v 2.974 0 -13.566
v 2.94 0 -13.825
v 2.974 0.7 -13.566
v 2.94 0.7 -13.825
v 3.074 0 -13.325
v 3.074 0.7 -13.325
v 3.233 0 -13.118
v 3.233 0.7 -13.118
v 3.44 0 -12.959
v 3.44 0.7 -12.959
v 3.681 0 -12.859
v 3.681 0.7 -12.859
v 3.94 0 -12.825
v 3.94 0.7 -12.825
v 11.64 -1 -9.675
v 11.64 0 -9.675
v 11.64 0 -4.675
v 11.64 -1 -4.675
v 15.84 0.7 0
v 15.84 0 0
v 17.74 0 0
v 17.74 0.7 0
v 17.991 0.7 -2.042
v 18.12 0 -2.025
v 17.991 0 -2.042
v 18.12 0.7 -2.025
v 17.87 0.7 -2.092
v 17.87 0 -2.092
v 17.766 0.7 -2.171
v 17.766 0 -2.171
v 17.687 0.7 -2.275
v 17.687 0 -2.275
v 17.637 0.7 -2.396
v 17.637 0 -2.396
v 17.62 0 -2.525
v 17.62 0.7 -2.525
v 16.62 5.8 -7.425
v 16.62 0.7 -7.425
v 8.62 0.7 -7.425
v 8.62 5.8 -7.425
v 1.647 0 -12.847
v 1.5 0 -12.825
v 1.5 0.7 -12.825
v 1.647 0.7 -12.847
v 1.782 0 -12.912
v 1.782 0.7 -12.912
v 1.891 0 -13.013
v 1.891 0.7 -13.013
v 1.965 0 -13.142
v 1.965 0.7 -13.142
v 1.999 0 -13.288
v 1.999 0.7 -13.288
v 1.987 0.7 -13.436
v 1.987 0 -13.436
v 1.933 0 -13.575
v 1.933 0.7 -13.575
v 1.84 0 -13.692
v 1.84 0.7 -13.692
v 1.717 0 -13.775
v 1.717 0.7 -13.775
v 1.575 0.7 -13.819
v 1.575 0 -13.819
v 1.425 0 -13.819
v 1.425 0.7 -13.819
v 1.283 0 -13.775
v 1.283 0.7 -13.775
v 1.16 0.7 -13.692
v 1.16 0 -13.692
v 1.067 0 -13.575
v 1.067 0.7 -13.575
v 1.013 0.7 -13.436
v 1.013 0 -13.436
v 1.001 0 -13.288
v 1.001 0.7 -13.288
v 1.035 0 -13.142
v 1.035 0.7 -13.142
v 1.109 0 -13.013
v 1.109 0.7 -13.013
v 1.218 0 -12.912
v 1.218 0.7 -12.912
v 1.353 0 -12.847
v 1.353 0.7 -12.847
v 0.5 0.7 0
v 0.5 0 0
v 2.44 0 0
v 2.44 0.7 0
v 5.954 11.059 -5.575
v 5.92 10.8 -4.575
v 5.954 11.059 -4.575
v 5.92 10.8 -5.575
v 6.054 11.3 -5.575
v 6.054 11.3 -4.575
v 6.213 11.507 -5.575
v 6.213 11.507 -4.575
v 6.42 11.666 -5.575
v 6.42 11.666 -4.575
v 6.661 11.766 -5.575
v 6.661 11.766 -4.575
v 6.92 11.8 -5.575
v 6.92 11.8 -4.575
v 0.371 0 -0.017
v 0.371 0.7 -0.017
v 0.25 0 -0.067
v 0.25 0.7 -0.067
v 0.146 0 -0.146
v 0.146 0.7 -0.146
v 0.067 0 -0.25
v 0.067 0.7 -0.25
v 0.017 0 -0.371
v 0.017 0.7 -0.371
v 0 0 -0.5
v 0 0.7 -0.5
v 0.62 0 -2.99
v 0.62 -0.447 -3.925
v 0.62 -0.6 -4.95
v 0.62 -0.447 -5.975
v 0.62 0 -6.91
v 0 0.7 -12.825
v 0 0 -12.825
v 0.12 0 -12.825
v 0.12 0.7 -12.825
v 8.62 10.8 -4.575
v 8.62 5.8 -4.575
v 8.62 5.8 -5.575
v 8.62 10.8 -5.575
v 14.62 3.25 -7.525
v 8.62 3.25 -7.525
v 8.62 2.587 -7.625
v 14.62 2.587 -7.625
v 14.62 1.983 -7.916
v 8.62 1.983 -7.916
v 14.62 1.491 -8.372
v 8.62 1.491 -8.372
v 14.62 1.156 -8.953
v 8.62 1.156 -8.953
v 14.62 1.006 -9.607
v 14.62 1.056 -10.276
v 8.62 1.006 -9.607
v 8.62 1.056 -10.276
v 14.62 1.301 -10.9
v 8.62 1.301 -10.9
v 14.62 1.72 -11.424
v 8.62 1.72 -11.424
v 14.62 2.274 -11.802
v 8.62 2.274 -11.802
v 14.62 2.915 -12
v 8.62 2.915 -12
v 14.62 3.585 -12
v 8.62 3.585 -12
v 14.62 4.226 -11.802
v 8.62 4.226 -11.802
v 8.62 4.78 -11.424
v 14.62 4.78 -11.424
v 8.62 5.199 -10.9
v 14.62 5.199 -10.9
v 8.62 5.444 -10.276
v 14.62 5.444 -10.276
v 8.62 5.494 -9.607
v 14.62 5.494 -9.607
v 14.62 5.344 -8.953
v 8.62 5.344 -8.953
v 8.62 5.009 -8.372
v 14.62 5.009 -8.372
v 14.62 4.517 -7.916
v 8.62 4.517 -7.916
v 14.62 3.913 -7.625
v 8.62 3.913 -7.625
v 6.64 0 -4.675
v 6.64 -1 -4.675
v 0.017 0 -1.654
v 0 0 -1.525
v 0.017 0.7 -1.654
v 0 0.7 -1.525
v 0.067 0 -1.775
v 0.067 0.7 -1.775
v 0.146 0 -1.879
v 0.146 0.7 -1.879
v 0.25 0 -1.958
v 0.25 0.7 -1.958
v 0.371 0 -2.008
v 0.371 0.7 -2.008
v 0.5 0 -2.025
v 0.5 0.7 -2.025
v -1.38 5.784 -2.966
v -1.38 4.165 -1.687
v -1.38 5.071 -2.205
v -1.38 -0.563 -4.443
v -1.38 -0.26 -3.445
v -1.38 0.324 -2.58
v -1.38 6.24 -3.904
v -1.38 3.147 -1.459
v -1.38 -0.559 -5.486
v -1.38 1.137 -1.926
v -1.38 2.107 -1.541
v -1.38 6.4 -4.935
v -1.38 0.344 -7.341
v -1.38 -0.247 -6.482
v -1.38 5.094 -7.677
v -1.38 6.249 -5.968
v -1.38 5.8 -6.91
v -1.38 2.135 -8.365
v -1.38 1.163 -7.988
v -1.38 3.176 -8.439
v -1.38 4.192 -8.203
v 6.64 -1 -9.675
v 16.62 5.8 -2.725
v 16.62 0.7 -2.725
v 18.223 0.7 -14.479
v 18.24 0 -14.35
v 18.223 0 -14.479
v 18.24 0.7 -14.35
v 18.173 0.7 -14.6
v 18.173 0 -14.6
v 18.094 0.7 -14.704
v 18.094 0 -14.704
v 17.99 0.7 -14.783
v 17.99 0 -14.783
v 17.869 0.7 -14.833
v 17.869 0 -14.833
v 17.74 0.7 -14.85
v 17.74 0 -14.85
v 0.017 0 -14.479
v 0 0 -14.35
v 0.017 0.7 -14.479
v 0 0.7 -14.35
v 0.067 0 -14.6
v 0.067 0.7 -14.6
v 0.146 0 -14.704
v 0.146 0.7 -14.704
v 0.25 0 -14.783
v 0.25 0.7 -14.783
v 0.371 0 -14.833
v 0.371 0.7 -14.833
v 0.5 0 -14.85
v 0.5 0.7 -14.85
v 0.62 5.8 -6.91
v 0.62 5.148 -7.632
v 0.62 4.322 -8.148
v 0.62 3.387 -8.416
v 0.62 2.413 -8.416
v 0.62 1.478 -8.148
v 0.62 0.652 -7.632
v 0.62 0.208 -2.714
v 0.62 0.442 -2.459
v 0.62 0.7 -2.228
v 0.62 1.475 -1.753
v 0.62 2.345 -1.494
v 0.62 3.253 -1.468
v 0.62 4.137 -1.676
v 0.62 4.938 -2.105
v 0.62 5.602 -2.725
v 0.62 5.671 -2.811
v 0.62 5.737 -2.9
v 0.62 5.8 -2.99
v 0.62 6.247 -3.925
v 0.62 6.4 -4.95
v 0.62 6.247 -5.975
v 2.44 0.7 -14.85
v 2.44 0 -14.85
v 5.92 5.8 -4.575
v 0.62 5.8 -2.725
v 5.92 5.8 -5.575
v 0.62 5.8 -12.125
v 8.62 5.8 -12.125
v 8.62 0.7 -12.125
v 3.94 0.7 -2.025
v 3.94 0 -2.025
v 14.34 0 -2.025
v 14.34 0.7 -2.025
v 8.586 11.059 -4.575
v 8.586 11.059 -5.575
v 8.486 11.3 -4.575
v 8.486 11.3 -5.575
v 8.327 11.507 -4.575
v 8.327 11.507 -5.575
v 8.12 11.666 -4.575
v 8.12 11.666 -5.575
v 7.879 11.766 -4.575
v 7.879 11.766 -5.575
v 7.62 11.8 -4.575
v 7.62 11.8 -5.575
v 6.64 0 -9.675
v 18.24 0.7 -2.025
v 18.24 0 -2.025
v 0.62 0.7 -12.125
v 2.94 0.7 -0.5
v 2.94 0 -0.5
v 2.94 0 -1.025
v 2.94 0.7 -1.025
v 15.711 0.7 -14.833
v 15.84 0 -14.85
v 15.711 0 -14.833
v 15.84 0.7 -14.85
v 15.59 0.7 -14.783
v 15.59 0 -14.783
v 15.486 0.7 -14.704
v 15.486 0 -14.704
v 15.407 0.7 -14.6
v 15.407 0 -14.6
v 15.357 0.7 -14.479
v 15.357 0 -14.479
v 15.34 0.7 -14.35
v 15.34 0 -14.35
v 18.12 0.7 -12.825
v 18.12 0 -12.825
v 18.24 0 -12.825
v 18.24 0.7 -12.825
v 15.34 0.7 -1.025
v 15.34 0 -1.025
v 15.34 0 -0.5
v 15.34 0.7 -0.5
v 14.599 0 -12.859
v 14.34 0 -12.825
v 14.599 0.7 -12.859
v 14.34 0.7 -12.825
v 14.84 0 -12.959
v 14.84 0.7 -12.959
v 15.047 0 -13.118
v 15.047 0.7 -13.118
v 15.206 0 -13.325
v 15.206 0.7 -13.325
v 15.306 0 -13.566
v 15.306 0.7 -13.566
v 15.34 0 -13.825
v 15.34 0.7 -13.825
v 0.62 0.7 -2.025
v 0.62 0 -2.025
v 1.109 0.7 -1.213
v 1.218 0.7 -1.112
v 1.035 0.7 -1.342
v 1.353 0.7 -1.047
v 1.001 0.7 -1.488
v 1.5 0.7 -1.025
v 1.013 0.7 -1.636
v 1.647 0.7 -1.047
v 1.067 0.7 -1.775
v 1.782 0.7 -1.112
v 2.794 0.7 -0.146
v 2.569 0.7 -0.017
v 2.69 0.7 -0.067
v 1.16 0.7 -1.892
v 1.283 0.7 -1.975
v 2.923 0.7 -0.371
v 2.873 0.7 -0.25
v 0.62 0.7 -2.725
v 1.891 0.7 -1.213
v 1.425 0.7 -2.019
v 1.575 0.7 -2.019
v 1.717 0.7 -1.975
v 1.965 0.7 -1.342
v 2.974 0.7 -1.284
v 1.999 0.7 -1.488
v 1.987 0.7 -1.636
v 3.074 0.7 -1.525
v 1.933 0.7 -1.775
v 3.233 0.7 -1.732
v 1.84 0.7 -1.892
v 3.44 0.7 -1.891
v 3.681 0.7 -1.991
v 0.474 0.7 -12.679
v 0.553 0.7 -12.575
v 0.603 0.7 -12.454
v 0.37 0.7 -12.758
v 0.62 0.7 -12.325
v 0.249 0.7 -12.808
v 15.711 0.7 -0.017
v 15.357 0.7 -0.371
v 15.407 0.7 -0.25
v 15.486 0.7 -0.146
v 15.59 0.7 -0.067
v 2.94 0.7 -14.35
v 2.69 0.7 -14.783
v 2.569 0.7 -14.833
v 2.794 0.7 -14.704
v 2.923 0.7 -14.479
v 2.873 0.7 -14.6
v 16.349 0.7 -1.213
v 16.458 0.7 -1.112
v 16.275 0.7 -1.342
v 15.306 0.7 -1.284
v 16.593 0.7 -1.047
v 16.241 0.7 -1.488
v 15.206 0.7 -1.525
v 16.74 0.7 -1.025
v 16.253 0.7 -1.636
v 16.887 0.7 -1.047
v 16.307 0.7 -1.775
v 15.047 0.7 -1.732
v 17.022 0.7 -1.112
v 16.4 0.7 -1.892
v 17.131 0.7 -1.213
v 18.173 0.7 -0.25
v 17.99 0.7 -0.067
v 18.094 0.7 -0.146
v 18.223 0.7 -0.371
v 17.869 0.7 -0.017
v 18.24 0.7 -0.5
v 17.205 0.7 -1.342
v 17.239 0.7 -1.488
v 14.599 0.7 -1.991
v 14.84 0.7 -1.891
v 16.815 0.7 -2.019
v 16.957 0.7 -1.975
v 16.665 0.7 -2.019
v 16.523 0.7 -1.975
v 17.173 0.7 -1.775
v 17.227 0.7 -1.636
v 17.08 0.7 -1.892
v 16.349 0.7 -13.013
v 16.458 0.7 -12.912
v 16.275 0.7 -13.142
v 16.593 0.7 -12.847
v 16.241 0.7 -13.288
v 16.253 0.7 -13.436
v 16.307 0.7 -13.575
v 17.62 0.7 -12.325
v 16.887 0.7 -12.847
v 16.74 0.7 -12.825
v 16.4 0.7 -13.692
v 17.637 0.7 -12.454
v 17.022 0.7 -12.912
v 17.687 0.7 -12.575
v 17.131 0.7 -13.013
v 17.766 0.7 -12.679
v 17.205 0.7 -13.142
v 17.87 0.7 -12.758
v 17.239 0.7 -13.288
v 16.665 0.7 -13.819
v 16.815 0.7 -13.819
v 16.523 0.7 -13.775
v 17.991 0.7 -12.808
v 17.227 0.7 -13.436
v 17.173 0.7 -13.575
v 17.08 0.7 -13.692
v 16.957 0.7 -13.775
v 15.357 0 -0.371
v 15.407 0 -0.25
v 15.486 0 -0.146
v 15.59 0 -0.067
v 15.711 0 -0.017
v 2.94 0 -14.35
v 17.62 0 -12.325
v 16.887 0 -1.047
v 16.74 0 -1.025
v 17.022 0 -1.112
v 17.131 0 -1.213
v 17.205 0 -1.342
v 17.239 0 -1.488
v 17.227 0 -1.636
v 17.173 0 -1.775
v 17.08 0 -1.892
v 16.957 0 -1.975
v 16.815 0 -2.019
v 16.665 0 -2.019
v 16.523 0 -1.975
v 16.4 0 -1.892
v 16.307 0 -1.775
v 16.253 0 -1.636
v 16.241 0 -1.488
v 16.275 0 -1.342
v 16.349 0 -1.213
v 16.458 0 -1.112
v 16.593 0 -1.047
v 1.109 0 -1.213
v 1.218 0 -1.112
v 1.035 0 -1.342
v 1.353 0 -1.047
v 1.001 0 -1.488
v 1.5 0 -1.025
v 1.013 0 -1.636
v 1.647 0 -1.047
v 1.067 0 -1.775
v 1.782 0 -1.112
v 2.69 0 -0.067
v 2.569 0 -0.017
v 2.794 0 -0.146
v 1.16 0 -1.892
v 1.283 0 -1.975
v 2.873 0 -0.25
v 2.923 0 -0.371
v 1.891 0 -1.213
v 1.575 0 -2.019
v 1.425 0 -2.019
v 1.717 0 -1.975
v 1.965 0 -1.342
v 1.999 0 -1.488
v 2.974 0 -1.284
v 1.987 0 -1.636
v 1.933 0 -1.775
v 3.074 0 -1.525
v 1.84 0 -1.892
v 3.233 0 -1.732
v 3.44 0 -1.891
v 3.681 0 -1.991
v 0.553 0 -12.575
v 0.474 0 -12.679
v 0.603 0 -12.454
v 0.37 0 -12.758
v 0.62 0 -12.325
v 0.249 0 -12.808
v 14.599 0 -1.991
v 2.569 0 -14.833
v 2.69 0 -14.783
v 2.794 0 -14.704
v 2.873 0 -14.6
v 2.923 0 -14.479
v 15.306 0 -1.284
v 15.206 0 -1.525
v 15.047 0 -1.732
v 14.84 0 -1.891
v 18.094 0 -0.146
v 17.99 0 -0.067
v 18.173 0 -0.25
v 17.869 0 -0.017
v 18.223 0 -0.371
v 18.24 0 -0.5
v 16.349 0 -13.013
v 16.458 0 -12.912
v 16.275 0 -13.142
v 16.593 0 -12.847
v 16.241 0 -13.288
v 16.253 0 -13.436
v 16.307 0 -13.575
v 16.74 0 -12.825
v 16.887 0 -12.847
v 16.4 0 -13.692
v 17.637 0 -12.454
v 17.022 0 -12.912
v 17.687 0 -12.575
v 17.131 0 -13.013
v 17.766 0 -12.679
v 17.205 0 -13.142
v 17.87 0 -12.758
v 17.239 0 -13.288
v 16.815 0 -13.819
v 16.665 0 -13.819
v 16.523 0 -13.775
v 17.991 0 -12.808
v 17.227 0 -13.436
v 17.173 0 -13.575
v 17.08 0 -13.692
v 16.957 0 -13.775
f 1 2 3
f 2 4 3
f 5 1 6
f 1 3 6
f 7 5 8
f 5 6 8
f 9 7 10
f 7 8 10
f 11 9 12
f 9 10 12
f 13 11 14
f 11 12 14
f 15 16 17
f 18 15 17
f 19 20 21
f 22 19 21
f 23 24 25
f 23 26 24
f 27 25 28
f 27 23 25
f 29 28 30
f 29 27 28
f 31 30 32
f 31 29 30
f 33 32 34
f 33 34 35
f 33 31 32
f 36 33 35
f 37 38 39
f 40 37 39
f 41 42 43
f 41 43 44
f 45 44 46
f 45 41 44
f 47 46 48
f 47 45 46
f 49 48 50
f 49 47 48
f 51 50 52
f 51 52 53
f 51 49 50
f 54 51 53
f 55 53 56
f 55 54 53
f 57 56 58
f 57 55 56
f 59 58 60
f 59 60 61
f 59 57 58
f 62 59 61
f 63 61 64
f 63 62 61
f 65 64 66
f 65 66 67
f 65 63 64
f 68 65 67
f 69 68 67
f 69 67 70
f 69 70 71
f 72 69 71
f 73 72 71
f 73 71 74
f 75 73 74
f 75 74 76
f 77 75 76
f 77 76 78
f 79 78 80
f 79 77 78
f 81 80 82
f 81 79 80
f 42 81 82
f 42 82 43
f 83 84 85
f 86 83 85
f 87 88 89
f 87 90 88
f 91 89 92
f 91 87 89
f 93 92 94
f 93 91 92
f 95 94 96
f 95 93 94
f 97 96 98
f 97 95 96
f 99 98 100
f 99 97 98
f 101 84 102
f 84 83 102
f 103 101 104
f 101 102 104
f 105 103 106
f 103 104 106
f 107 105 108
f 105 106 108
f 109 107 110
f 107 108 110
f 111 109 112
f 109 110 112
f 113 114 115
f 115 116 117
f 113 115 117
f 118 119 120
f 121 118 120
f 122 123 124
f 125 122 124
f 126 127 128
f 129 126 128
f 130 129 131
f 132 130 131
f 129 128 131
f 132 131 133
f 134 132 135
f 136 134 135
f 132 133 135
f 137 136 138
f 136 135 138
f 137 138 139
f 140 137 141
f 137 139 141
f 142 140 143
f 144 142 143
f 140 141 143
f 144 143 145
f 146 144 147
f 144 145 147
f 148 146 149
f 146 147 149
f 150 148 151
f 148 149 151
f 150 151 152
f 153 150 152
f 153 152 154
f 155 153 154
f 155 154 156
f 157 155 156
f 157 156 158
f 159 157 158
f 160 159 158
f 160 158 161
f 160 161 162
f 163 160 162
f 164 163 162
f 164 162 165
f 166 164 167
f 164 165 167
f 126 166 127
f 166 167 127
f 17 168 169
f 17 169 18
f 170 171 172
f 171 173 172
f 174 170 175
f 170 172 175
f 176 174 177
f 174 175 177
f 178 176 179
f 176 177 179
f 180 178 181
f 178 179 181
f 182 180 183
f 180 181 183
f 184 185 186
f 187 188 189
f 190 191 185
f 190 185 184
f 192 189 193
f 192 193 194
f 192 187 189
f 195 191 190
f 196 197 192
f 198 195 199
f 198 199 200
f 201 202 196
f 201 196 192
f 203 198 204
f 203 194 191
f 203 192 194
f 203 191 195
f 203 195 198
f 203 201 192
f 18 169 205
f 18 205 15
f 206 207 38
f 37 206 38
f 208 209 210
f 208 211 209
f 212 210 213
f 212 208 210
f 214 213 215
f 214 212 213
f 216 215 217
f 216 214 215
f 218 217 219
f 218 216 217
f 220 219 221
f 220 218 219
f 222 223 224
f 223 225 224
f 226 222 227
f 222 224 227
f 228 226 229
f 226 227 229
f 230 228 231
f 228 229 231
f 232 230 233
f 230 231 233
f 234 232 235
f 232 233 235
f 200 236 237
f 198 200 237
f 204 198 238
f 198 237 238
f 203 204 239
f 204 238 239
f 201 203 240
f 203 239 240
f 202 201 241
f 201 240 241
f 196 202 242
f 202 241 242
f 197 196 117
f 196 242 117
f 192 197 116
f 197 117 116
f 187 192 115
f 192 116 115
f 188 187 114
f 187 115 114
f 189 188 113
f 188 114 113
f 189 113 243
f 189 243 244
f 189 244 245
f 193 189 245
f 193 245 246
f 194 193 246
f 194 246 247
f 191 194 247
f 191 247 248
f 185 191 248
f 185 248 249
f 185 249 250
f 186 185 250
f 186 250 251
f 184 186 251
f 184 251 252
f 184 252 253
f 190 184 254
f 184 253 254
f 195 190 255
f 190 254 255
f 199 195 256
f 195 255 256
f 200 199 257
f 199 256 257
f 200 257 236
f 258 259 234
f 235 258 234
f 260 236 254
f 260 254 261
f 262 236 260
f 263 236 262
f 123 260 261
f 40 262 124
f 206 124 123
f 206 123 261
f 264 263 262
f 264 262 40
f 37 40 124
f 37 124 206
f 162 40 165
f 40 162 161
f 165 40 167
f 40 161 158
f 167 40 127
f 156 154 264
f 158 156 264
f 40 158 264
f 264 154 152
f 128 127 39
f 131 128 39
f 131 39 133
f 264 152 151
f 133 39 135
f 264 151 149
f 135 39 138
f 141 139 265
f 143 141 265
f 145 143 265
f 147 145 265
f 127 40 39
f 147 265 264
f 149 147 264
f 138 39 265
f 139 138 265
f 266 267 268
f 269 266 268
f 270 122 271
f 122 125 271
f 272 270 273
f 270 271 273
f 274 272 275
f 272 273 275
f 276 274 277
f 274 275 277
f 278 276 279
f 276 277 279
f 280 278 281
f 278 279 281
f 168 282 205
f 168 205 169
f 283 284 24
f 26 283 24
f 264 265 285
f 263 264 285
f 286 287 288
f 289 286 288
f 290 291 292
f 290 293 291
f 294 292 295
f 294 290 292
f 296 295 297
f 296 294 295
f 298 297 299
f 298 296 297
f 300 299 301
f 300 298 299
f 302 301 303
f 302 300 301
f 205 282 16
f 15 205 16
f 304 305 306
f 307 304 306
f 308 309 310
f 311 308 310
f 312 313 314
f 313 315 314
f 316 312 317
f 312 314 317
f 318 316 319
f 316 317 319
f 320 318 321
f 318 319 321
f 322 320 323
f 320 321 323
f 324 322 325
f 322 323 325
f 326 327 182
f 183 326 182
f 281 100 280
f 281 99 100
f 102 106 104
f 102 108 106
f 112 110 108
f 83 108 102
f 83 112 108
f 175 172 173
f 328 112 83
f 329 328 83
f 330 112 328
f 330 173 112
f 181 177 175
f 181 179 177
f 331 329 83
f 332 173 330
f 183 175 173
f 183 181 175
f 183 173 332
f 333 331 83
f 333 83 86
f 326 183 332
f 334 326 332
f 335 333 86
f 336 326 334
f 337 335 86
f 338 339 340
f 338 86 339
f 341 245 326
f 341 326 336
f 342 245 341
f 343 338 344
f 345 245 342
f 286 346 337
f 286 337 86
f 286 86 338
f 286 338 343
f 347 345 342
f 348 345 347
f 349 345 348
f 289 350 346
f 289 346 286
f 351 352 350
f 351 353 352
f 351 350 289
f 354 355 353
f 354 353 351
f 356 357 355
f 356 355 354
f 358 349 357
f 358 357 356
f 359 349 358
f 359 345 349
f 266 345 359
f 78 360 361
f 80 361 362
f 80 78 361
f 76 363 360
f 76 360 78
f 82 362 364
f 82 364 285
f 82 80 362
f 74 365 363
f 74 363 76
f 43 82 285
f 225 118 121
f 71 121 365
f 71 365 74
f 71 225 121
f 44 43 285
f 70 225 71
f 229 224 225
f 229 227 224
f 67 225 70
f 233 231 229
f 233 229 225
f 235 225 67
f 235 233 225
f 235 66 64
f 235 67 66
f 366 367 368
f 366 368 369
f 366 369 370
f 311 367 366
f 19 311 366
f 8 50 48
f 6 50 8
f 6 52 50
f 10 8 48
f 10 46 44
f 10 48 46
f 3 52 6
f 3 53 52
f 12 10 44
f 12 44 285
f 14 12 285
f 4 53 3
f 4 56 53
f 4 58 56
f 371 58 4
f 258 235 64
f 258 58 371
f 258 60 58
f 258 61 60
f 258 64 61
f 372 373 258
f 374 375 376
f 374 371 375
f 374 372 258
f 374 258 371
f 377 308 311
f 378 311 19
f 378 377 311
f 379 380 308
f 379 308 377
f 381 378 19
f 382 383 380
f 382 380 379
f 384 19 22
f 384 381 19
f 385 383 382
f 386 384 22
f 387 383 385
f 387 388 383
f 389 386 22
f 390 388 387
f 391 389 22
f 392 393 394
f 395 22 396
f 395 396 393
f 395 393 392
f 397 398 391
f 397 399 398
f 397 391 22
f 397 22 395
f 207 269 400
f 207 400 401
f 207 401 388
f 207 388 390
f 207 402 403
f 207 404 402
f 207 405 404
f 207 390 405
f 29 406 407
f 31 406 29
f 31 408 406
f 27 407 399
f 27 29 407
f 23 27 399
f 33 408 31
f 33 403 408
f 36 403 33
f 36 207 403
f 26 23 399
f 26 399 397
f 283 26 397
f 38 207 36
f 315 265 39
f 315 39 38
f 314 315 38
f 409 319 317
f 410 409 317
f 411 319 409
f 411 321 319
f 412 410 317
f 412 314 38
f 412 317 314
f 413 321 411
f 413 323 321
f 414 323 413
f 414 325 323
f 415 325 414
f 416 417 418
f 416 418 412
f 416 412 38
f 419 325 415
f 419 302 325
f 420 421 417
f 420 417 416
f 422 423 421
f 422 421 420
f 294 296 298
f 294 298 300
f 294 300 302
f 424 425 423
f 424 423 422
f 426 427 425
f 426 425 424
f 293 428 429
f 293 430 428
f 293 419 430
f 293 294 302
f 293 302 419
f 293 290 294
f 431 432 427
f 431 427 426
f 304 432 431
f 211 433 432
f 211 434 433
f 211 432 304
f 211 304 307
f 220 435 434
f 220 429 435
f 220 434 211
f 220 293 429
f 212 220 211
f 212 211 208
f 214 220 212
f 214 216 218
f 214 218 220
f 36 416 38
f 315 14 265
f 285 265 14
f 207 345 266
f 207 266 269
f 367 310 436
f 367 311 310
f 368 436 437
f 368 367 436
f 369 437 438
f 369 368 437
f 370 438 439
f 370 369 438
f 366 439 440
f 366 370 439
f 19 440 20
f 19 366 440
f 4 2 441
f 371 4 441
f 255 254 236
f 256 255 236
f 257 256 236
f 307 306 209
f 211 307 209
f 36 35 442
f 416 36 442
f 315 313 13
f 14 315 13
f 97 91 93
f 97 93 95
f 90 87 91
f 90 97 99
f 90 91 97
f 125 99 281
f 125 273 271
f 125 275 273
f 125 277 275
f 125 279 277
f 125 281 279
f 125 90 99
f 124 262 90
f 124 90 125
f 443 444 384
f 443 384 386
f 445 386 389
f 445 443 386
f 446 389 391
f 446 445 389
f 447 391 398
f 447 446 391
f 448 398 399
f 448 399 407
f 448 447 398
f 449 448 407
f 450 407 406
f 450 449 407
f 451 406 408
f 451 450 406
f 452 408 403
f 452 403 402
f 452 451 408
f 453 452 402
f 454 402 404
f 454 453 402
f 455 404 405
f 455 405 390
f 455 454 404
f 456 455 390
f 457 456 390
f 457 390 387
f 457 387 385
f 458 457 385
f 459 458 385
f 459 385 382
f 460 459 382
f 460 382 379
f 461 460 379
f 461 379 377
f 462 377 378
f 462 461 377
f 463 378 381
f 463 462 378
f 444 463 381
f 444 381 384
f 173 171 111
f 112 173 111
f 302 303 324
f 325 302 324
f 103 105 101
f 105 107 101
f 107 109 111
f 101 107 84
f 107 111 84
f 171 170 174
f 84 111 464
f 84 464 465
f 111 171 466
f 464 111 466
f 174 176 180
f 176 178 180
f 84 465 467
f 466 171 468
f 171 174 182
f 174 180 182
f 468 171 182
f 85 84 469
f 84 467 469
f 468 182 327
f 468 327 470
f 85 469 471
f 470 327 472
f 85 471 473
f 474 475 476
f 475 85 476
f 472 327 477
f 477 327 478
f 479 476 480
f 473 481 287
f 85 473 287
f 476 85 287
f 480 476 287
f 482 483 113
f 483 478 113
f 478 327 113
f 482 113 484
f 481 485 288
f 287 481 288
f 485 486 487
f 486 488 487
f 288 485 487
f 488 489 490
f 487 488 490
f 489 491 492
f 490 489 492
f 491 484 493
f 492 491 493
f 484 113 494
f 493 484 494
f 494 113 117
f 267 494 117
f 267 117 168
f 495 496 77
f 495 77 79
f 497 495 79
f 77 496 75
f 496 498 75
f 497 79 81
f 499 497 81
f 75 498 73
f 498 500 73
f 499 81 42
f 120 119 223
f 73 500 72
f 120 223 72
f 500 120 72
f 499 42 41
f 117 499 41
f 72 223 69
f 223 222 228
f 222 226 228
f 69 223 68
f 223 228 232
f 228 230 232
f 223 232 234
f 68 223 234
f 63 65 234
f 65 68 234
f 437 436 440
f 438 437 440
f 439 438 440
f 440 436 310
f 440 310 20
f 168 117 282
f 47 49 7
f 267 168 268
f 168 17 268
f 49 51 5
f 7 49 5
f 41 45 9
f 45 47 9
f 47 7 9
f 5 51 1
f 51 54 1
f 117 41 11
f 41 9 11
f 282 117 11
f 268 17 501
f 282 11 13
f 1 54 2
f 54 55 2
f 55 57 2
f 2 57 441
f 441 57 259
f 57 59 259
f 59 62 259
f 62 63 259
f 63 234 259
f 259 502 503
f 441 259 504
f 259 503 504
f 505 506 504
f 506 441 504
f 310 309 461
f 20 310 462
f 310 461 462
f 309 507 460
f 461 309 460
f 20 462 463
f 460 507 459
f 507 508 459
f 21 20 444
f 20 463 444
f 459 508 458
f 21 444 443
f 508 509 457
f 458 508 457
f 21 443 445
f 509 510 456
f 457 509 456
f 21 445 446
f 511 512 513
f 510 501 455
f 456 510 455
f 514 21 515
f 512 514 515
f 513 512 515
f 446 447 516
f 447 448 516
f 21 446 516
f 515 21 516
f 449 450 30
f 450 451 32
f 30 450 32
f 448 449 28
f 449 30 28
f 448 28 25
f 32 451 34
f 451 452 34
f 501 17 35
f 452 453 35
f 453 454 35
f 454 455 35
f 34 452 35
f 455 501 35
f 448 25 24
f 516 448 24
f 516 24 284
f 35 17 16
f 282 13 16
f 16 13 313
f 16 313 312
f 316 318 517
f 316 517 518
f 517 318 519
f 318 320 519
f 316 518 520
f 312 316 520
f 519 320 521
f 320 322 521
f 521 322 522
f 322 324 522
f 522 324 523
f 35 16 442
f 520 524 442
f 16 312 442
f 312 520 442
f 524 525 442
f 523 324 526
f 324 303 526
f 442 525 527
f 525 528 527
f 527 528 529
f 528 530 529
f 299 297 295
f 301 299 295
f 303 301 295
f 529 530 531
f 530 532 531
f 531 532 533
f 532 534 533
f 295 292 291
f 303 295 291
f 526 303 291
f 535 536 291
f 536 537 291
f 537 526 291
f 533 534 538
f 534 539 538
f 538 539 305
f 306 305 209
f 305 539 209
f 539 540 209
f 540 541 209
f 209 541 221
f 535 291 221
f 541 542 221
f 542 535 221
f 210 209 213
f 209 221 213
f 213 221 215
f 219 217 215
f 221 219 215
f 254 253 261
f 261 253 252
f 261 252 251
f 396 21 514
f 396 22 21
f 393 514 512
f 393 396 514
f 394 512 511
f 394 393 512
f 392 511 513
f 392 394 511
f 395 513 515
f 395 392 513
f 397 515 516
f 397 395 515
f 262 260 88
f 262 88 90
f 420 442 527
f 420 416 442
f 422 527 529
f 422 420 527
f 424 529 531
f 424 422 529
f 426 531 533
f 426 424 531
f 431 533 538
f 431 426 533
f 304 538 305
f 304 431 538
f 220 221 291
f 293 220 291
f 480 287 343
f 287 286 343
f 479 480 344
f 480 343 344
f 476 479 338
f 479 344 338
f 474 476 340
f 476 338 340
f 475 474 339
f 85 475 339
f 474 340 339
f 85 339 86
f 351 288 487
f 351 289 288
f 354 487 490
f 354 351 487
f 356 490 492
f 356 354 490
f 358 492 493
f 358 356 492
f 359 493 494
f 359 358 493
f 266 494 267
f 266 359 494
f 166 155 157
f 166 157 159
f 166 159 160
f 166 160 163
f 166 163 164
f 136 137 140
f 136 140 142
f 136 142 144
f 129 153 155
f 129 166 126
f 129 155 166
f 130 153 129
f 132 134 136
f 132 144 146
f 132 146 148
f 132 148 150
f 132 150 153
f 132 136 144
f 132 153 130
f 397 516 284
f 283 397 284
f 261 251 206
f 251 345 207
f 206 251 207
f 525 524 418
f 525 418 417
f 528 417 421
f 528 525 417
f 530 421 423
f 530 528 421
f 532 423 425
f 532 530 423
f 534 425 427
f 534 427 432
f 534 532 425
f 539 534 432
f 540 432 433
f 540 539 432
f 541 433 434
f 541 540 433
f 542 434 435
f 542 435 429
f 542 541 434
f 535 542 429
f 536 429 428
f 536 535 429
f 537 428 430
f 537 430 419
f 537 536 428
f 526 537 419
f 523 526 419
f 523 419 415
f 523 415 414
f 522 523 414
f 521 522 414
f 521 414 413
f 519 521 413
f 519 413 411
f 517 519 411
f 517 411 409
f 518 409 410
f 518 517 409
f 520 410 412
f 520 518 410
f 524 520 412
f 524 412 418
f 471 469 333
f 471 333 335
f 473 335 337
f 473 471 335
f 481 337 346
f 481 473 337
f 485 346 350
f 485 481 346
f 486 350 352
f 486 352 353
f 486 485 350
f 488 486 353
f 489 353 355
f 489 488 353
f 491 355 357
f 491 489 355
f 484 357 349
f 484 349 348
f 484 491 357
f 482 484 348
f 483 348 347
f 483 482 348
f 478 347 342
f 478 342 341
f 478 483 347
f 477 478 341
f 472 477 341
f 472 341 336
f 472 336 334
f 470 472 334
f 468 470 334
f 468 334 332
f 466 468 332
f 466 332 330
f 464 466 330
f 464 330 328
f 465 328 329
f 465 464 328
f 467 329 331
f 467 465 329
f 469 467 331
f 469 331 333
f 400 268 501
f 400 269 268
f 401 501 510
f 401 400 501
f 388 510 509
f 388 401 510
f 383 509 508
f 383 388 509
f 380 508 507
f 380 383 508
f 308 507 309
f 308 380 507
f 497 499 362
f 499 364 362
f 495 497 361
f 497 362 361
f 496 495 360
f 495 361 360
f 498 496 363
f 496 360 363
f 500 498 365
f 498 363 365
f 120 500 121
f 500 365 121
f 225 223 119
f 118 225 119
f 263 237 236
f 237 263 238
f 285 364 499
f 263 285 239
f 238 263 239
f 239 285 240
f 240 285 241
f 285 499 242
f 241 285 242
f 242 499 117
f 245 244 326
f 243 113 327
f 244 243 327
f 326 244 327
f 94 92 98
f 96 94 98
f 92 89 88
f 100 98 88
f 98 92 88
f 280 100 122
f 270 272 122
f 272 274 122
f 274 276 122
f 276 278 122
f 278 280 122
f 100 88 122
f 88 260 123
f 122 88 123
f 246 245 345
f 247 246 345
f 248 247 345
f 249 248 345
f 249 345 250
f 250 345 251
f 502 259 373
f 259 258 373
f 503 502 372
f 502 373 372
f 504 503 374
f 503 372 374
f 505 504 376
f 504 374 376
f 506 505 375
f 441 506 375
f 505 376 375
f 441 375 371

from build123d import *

# Parameters (mm, degrees)
SKETCH1_R            = 0.5
BOSS_EXTRUDE1_DEPTH  = 0.7
FILLET1_R            = 1
FILLET2_R            = 0.5
BOSS_EXTRUDE2_DEPTH  = 5.1
SKETCH3_R            = 2.25
BOSS_EXTRUDE7_DEPTH  = 6
SKETCH4_W            = 5
SKETCH4_H            = 5
BOSS_EXTRUDE8_DEPTH  = 1
SKETCH5_R            = 3.5
BOSS_EXTRUDE9_DEPTH  = 2
SKETCH6_W            = 2.7
SKETCH6_H            = 1
BOSS_EXTRUDE10_DEPTH = 6
FILLET3_R            = 1


with BuildPart() as part:
    # Sketch1 → Boss-Extrude1 (new body)
    with BuildSketch(Plane(origin=(0, 0, 0), x_dir=(1, 0, 0), z_dir=(0, 1, 0))):
        Polygon((0, 0), (2.94, 0), (2.94, 2.025), (15.34, 2.025), (15.34, 0), (18.24, 0), (18.24, 2.025), (17.62, 2.025), (17.62, 12.825), (18.24, 12.825), (18.24, 14.85), (15.34, 14.85), (15.34, 12.825), (2.94, 12.825), (2.94, 14.85), (0, 14.85), (0, 12.825), (0.62, 12.825), (0.62, 2.025), (0, 2.025), align=None)
        with Locations(Location((1.5, 13.325, 0), (0, 0, 270))):
            Circle(SKETCH1_R, mode=Mode.SUBTRACT)
        with Locations(Location((1.5, 1.525, 0), (0, 0, 270))):
            Circle(SKETCH1_R, mode=Mode.SUBTRACT)
        with Locations(Location((16.74, 1.525, 0), (0, 0, 270))):
            Circle(SKETCH1_R, mode=Mode.SUBTRACT)
        with Locations(Location((16.74, 13.325, 0), (0, 0, 270))):
            Circle(SKETCH1_R, mode=Mode.SUBTRACT)
    extrude(amount=BOSS_EXTRUDE1_DEPTH)

    # Fillet1
    fillet1_edges = [part.edges().sort_by_distance(p)[0] for p in [
        (2.94, 0.35, -12.825),
        (15.34, 0.35, -12.825),
        (15.34, 0.35, -2.025),
        (2.94, 0.35, -2.025),
    ]]
    fillet(fillet1_edges, radius=FILLET1_R)

    # Fillet2
    fillet2_edges = [part.edges().sort_by_distance(p)[0] for p in [
        (0, 0.35, -2.025),
        (0.62, 0.35, -12.825),
        (0, 0.35, -14.85),
        (2.94, 0.35, -14.85),
        (15.34, 0.35, -14.85),
        (18.24, 0.35, -14.85),
        (17.62, 0.35, -12.825),
        (17.62, 0.35, -2.025),
        (18.24, 0.35, 0),
        (15.34, 0.35, 0),
        (2.94, 0.35, 0),
        (0, 0.35, 0),
    ]]
    fillet(fillet2_edges, radius=FILLET2_R)

    # Sketch2 → Boss-Extrude2 (add)
    with BuildSketch(Plane(origin=(0, 0.7, 0), x_dir=(1, 0, 0), z_dir=(0, 1, 0))):
        Polygon((0.62, 2.725), (16.62, 2.725), (16.62, 7.425), (8.62, 7.425), (8.62, 12.125), (0.62, 12.125), align=None)
    extrude(amount=BOSS_EXTRUDE2_DEPTH)

    # Sketch3 → Boss-Extrude7 (add)
    with BuildSketch(Plane(origin=(8.62, 0, 0), x_dir=(0, 0, -1), z_dir=(1, 0, 0))):
        with Locations(Location((9.775, 3.25, 0), (0, 0, 180))):
            Circle(SKETCH3_R)
    extrude(amount=BOSS_EXTRUDE7_DEPTH)

    # Sketch4 → Boss-Extrude8 (add)
    with BuildSketch(Plane.XZ):
        with Locations((9.14, -7.175)):
            Rectangle(SKETCH4_W, SKETCH4_H)
    extrude(amount=BOSS_EXTRUDE8_DEPTH)

    # Sketch5 → Boss-Extrude9 (add)
    with BuildSketch(Plane.ZY.offset(-0.62)):
        with Locations(Location((-4.95, 2.9, 0), (0, 0, 124.04773237))):
            Circle(SKETCH5_R)
    extrude(amount=BOSS_EXTRUDE9_DEPTH)

    # Sketch6 → Boss-Extrude10 (add)
    with BuildSketch(Plane(origin=(0, 5.8, 0), x_dir=(1, 0, 0), z_dir=(0, 1, 0))):
        with Locations((7.27, 5.075)):
            Rectangle(SKETCH6_W, SKETCH6_H)
    extrude(amount=BOSS_EXTRUDE10_DEPTH)

    # Fillet3
    fillet3_edges = [part.edges().sort_by_distance(p)[0] for p in [
        (5.92, 11.8, -5.075),
        (8.62, 11.8, -5.075),
    ]]
    fillet(fillet3_edges, radius=FILLET3_R)


solid = part.part
